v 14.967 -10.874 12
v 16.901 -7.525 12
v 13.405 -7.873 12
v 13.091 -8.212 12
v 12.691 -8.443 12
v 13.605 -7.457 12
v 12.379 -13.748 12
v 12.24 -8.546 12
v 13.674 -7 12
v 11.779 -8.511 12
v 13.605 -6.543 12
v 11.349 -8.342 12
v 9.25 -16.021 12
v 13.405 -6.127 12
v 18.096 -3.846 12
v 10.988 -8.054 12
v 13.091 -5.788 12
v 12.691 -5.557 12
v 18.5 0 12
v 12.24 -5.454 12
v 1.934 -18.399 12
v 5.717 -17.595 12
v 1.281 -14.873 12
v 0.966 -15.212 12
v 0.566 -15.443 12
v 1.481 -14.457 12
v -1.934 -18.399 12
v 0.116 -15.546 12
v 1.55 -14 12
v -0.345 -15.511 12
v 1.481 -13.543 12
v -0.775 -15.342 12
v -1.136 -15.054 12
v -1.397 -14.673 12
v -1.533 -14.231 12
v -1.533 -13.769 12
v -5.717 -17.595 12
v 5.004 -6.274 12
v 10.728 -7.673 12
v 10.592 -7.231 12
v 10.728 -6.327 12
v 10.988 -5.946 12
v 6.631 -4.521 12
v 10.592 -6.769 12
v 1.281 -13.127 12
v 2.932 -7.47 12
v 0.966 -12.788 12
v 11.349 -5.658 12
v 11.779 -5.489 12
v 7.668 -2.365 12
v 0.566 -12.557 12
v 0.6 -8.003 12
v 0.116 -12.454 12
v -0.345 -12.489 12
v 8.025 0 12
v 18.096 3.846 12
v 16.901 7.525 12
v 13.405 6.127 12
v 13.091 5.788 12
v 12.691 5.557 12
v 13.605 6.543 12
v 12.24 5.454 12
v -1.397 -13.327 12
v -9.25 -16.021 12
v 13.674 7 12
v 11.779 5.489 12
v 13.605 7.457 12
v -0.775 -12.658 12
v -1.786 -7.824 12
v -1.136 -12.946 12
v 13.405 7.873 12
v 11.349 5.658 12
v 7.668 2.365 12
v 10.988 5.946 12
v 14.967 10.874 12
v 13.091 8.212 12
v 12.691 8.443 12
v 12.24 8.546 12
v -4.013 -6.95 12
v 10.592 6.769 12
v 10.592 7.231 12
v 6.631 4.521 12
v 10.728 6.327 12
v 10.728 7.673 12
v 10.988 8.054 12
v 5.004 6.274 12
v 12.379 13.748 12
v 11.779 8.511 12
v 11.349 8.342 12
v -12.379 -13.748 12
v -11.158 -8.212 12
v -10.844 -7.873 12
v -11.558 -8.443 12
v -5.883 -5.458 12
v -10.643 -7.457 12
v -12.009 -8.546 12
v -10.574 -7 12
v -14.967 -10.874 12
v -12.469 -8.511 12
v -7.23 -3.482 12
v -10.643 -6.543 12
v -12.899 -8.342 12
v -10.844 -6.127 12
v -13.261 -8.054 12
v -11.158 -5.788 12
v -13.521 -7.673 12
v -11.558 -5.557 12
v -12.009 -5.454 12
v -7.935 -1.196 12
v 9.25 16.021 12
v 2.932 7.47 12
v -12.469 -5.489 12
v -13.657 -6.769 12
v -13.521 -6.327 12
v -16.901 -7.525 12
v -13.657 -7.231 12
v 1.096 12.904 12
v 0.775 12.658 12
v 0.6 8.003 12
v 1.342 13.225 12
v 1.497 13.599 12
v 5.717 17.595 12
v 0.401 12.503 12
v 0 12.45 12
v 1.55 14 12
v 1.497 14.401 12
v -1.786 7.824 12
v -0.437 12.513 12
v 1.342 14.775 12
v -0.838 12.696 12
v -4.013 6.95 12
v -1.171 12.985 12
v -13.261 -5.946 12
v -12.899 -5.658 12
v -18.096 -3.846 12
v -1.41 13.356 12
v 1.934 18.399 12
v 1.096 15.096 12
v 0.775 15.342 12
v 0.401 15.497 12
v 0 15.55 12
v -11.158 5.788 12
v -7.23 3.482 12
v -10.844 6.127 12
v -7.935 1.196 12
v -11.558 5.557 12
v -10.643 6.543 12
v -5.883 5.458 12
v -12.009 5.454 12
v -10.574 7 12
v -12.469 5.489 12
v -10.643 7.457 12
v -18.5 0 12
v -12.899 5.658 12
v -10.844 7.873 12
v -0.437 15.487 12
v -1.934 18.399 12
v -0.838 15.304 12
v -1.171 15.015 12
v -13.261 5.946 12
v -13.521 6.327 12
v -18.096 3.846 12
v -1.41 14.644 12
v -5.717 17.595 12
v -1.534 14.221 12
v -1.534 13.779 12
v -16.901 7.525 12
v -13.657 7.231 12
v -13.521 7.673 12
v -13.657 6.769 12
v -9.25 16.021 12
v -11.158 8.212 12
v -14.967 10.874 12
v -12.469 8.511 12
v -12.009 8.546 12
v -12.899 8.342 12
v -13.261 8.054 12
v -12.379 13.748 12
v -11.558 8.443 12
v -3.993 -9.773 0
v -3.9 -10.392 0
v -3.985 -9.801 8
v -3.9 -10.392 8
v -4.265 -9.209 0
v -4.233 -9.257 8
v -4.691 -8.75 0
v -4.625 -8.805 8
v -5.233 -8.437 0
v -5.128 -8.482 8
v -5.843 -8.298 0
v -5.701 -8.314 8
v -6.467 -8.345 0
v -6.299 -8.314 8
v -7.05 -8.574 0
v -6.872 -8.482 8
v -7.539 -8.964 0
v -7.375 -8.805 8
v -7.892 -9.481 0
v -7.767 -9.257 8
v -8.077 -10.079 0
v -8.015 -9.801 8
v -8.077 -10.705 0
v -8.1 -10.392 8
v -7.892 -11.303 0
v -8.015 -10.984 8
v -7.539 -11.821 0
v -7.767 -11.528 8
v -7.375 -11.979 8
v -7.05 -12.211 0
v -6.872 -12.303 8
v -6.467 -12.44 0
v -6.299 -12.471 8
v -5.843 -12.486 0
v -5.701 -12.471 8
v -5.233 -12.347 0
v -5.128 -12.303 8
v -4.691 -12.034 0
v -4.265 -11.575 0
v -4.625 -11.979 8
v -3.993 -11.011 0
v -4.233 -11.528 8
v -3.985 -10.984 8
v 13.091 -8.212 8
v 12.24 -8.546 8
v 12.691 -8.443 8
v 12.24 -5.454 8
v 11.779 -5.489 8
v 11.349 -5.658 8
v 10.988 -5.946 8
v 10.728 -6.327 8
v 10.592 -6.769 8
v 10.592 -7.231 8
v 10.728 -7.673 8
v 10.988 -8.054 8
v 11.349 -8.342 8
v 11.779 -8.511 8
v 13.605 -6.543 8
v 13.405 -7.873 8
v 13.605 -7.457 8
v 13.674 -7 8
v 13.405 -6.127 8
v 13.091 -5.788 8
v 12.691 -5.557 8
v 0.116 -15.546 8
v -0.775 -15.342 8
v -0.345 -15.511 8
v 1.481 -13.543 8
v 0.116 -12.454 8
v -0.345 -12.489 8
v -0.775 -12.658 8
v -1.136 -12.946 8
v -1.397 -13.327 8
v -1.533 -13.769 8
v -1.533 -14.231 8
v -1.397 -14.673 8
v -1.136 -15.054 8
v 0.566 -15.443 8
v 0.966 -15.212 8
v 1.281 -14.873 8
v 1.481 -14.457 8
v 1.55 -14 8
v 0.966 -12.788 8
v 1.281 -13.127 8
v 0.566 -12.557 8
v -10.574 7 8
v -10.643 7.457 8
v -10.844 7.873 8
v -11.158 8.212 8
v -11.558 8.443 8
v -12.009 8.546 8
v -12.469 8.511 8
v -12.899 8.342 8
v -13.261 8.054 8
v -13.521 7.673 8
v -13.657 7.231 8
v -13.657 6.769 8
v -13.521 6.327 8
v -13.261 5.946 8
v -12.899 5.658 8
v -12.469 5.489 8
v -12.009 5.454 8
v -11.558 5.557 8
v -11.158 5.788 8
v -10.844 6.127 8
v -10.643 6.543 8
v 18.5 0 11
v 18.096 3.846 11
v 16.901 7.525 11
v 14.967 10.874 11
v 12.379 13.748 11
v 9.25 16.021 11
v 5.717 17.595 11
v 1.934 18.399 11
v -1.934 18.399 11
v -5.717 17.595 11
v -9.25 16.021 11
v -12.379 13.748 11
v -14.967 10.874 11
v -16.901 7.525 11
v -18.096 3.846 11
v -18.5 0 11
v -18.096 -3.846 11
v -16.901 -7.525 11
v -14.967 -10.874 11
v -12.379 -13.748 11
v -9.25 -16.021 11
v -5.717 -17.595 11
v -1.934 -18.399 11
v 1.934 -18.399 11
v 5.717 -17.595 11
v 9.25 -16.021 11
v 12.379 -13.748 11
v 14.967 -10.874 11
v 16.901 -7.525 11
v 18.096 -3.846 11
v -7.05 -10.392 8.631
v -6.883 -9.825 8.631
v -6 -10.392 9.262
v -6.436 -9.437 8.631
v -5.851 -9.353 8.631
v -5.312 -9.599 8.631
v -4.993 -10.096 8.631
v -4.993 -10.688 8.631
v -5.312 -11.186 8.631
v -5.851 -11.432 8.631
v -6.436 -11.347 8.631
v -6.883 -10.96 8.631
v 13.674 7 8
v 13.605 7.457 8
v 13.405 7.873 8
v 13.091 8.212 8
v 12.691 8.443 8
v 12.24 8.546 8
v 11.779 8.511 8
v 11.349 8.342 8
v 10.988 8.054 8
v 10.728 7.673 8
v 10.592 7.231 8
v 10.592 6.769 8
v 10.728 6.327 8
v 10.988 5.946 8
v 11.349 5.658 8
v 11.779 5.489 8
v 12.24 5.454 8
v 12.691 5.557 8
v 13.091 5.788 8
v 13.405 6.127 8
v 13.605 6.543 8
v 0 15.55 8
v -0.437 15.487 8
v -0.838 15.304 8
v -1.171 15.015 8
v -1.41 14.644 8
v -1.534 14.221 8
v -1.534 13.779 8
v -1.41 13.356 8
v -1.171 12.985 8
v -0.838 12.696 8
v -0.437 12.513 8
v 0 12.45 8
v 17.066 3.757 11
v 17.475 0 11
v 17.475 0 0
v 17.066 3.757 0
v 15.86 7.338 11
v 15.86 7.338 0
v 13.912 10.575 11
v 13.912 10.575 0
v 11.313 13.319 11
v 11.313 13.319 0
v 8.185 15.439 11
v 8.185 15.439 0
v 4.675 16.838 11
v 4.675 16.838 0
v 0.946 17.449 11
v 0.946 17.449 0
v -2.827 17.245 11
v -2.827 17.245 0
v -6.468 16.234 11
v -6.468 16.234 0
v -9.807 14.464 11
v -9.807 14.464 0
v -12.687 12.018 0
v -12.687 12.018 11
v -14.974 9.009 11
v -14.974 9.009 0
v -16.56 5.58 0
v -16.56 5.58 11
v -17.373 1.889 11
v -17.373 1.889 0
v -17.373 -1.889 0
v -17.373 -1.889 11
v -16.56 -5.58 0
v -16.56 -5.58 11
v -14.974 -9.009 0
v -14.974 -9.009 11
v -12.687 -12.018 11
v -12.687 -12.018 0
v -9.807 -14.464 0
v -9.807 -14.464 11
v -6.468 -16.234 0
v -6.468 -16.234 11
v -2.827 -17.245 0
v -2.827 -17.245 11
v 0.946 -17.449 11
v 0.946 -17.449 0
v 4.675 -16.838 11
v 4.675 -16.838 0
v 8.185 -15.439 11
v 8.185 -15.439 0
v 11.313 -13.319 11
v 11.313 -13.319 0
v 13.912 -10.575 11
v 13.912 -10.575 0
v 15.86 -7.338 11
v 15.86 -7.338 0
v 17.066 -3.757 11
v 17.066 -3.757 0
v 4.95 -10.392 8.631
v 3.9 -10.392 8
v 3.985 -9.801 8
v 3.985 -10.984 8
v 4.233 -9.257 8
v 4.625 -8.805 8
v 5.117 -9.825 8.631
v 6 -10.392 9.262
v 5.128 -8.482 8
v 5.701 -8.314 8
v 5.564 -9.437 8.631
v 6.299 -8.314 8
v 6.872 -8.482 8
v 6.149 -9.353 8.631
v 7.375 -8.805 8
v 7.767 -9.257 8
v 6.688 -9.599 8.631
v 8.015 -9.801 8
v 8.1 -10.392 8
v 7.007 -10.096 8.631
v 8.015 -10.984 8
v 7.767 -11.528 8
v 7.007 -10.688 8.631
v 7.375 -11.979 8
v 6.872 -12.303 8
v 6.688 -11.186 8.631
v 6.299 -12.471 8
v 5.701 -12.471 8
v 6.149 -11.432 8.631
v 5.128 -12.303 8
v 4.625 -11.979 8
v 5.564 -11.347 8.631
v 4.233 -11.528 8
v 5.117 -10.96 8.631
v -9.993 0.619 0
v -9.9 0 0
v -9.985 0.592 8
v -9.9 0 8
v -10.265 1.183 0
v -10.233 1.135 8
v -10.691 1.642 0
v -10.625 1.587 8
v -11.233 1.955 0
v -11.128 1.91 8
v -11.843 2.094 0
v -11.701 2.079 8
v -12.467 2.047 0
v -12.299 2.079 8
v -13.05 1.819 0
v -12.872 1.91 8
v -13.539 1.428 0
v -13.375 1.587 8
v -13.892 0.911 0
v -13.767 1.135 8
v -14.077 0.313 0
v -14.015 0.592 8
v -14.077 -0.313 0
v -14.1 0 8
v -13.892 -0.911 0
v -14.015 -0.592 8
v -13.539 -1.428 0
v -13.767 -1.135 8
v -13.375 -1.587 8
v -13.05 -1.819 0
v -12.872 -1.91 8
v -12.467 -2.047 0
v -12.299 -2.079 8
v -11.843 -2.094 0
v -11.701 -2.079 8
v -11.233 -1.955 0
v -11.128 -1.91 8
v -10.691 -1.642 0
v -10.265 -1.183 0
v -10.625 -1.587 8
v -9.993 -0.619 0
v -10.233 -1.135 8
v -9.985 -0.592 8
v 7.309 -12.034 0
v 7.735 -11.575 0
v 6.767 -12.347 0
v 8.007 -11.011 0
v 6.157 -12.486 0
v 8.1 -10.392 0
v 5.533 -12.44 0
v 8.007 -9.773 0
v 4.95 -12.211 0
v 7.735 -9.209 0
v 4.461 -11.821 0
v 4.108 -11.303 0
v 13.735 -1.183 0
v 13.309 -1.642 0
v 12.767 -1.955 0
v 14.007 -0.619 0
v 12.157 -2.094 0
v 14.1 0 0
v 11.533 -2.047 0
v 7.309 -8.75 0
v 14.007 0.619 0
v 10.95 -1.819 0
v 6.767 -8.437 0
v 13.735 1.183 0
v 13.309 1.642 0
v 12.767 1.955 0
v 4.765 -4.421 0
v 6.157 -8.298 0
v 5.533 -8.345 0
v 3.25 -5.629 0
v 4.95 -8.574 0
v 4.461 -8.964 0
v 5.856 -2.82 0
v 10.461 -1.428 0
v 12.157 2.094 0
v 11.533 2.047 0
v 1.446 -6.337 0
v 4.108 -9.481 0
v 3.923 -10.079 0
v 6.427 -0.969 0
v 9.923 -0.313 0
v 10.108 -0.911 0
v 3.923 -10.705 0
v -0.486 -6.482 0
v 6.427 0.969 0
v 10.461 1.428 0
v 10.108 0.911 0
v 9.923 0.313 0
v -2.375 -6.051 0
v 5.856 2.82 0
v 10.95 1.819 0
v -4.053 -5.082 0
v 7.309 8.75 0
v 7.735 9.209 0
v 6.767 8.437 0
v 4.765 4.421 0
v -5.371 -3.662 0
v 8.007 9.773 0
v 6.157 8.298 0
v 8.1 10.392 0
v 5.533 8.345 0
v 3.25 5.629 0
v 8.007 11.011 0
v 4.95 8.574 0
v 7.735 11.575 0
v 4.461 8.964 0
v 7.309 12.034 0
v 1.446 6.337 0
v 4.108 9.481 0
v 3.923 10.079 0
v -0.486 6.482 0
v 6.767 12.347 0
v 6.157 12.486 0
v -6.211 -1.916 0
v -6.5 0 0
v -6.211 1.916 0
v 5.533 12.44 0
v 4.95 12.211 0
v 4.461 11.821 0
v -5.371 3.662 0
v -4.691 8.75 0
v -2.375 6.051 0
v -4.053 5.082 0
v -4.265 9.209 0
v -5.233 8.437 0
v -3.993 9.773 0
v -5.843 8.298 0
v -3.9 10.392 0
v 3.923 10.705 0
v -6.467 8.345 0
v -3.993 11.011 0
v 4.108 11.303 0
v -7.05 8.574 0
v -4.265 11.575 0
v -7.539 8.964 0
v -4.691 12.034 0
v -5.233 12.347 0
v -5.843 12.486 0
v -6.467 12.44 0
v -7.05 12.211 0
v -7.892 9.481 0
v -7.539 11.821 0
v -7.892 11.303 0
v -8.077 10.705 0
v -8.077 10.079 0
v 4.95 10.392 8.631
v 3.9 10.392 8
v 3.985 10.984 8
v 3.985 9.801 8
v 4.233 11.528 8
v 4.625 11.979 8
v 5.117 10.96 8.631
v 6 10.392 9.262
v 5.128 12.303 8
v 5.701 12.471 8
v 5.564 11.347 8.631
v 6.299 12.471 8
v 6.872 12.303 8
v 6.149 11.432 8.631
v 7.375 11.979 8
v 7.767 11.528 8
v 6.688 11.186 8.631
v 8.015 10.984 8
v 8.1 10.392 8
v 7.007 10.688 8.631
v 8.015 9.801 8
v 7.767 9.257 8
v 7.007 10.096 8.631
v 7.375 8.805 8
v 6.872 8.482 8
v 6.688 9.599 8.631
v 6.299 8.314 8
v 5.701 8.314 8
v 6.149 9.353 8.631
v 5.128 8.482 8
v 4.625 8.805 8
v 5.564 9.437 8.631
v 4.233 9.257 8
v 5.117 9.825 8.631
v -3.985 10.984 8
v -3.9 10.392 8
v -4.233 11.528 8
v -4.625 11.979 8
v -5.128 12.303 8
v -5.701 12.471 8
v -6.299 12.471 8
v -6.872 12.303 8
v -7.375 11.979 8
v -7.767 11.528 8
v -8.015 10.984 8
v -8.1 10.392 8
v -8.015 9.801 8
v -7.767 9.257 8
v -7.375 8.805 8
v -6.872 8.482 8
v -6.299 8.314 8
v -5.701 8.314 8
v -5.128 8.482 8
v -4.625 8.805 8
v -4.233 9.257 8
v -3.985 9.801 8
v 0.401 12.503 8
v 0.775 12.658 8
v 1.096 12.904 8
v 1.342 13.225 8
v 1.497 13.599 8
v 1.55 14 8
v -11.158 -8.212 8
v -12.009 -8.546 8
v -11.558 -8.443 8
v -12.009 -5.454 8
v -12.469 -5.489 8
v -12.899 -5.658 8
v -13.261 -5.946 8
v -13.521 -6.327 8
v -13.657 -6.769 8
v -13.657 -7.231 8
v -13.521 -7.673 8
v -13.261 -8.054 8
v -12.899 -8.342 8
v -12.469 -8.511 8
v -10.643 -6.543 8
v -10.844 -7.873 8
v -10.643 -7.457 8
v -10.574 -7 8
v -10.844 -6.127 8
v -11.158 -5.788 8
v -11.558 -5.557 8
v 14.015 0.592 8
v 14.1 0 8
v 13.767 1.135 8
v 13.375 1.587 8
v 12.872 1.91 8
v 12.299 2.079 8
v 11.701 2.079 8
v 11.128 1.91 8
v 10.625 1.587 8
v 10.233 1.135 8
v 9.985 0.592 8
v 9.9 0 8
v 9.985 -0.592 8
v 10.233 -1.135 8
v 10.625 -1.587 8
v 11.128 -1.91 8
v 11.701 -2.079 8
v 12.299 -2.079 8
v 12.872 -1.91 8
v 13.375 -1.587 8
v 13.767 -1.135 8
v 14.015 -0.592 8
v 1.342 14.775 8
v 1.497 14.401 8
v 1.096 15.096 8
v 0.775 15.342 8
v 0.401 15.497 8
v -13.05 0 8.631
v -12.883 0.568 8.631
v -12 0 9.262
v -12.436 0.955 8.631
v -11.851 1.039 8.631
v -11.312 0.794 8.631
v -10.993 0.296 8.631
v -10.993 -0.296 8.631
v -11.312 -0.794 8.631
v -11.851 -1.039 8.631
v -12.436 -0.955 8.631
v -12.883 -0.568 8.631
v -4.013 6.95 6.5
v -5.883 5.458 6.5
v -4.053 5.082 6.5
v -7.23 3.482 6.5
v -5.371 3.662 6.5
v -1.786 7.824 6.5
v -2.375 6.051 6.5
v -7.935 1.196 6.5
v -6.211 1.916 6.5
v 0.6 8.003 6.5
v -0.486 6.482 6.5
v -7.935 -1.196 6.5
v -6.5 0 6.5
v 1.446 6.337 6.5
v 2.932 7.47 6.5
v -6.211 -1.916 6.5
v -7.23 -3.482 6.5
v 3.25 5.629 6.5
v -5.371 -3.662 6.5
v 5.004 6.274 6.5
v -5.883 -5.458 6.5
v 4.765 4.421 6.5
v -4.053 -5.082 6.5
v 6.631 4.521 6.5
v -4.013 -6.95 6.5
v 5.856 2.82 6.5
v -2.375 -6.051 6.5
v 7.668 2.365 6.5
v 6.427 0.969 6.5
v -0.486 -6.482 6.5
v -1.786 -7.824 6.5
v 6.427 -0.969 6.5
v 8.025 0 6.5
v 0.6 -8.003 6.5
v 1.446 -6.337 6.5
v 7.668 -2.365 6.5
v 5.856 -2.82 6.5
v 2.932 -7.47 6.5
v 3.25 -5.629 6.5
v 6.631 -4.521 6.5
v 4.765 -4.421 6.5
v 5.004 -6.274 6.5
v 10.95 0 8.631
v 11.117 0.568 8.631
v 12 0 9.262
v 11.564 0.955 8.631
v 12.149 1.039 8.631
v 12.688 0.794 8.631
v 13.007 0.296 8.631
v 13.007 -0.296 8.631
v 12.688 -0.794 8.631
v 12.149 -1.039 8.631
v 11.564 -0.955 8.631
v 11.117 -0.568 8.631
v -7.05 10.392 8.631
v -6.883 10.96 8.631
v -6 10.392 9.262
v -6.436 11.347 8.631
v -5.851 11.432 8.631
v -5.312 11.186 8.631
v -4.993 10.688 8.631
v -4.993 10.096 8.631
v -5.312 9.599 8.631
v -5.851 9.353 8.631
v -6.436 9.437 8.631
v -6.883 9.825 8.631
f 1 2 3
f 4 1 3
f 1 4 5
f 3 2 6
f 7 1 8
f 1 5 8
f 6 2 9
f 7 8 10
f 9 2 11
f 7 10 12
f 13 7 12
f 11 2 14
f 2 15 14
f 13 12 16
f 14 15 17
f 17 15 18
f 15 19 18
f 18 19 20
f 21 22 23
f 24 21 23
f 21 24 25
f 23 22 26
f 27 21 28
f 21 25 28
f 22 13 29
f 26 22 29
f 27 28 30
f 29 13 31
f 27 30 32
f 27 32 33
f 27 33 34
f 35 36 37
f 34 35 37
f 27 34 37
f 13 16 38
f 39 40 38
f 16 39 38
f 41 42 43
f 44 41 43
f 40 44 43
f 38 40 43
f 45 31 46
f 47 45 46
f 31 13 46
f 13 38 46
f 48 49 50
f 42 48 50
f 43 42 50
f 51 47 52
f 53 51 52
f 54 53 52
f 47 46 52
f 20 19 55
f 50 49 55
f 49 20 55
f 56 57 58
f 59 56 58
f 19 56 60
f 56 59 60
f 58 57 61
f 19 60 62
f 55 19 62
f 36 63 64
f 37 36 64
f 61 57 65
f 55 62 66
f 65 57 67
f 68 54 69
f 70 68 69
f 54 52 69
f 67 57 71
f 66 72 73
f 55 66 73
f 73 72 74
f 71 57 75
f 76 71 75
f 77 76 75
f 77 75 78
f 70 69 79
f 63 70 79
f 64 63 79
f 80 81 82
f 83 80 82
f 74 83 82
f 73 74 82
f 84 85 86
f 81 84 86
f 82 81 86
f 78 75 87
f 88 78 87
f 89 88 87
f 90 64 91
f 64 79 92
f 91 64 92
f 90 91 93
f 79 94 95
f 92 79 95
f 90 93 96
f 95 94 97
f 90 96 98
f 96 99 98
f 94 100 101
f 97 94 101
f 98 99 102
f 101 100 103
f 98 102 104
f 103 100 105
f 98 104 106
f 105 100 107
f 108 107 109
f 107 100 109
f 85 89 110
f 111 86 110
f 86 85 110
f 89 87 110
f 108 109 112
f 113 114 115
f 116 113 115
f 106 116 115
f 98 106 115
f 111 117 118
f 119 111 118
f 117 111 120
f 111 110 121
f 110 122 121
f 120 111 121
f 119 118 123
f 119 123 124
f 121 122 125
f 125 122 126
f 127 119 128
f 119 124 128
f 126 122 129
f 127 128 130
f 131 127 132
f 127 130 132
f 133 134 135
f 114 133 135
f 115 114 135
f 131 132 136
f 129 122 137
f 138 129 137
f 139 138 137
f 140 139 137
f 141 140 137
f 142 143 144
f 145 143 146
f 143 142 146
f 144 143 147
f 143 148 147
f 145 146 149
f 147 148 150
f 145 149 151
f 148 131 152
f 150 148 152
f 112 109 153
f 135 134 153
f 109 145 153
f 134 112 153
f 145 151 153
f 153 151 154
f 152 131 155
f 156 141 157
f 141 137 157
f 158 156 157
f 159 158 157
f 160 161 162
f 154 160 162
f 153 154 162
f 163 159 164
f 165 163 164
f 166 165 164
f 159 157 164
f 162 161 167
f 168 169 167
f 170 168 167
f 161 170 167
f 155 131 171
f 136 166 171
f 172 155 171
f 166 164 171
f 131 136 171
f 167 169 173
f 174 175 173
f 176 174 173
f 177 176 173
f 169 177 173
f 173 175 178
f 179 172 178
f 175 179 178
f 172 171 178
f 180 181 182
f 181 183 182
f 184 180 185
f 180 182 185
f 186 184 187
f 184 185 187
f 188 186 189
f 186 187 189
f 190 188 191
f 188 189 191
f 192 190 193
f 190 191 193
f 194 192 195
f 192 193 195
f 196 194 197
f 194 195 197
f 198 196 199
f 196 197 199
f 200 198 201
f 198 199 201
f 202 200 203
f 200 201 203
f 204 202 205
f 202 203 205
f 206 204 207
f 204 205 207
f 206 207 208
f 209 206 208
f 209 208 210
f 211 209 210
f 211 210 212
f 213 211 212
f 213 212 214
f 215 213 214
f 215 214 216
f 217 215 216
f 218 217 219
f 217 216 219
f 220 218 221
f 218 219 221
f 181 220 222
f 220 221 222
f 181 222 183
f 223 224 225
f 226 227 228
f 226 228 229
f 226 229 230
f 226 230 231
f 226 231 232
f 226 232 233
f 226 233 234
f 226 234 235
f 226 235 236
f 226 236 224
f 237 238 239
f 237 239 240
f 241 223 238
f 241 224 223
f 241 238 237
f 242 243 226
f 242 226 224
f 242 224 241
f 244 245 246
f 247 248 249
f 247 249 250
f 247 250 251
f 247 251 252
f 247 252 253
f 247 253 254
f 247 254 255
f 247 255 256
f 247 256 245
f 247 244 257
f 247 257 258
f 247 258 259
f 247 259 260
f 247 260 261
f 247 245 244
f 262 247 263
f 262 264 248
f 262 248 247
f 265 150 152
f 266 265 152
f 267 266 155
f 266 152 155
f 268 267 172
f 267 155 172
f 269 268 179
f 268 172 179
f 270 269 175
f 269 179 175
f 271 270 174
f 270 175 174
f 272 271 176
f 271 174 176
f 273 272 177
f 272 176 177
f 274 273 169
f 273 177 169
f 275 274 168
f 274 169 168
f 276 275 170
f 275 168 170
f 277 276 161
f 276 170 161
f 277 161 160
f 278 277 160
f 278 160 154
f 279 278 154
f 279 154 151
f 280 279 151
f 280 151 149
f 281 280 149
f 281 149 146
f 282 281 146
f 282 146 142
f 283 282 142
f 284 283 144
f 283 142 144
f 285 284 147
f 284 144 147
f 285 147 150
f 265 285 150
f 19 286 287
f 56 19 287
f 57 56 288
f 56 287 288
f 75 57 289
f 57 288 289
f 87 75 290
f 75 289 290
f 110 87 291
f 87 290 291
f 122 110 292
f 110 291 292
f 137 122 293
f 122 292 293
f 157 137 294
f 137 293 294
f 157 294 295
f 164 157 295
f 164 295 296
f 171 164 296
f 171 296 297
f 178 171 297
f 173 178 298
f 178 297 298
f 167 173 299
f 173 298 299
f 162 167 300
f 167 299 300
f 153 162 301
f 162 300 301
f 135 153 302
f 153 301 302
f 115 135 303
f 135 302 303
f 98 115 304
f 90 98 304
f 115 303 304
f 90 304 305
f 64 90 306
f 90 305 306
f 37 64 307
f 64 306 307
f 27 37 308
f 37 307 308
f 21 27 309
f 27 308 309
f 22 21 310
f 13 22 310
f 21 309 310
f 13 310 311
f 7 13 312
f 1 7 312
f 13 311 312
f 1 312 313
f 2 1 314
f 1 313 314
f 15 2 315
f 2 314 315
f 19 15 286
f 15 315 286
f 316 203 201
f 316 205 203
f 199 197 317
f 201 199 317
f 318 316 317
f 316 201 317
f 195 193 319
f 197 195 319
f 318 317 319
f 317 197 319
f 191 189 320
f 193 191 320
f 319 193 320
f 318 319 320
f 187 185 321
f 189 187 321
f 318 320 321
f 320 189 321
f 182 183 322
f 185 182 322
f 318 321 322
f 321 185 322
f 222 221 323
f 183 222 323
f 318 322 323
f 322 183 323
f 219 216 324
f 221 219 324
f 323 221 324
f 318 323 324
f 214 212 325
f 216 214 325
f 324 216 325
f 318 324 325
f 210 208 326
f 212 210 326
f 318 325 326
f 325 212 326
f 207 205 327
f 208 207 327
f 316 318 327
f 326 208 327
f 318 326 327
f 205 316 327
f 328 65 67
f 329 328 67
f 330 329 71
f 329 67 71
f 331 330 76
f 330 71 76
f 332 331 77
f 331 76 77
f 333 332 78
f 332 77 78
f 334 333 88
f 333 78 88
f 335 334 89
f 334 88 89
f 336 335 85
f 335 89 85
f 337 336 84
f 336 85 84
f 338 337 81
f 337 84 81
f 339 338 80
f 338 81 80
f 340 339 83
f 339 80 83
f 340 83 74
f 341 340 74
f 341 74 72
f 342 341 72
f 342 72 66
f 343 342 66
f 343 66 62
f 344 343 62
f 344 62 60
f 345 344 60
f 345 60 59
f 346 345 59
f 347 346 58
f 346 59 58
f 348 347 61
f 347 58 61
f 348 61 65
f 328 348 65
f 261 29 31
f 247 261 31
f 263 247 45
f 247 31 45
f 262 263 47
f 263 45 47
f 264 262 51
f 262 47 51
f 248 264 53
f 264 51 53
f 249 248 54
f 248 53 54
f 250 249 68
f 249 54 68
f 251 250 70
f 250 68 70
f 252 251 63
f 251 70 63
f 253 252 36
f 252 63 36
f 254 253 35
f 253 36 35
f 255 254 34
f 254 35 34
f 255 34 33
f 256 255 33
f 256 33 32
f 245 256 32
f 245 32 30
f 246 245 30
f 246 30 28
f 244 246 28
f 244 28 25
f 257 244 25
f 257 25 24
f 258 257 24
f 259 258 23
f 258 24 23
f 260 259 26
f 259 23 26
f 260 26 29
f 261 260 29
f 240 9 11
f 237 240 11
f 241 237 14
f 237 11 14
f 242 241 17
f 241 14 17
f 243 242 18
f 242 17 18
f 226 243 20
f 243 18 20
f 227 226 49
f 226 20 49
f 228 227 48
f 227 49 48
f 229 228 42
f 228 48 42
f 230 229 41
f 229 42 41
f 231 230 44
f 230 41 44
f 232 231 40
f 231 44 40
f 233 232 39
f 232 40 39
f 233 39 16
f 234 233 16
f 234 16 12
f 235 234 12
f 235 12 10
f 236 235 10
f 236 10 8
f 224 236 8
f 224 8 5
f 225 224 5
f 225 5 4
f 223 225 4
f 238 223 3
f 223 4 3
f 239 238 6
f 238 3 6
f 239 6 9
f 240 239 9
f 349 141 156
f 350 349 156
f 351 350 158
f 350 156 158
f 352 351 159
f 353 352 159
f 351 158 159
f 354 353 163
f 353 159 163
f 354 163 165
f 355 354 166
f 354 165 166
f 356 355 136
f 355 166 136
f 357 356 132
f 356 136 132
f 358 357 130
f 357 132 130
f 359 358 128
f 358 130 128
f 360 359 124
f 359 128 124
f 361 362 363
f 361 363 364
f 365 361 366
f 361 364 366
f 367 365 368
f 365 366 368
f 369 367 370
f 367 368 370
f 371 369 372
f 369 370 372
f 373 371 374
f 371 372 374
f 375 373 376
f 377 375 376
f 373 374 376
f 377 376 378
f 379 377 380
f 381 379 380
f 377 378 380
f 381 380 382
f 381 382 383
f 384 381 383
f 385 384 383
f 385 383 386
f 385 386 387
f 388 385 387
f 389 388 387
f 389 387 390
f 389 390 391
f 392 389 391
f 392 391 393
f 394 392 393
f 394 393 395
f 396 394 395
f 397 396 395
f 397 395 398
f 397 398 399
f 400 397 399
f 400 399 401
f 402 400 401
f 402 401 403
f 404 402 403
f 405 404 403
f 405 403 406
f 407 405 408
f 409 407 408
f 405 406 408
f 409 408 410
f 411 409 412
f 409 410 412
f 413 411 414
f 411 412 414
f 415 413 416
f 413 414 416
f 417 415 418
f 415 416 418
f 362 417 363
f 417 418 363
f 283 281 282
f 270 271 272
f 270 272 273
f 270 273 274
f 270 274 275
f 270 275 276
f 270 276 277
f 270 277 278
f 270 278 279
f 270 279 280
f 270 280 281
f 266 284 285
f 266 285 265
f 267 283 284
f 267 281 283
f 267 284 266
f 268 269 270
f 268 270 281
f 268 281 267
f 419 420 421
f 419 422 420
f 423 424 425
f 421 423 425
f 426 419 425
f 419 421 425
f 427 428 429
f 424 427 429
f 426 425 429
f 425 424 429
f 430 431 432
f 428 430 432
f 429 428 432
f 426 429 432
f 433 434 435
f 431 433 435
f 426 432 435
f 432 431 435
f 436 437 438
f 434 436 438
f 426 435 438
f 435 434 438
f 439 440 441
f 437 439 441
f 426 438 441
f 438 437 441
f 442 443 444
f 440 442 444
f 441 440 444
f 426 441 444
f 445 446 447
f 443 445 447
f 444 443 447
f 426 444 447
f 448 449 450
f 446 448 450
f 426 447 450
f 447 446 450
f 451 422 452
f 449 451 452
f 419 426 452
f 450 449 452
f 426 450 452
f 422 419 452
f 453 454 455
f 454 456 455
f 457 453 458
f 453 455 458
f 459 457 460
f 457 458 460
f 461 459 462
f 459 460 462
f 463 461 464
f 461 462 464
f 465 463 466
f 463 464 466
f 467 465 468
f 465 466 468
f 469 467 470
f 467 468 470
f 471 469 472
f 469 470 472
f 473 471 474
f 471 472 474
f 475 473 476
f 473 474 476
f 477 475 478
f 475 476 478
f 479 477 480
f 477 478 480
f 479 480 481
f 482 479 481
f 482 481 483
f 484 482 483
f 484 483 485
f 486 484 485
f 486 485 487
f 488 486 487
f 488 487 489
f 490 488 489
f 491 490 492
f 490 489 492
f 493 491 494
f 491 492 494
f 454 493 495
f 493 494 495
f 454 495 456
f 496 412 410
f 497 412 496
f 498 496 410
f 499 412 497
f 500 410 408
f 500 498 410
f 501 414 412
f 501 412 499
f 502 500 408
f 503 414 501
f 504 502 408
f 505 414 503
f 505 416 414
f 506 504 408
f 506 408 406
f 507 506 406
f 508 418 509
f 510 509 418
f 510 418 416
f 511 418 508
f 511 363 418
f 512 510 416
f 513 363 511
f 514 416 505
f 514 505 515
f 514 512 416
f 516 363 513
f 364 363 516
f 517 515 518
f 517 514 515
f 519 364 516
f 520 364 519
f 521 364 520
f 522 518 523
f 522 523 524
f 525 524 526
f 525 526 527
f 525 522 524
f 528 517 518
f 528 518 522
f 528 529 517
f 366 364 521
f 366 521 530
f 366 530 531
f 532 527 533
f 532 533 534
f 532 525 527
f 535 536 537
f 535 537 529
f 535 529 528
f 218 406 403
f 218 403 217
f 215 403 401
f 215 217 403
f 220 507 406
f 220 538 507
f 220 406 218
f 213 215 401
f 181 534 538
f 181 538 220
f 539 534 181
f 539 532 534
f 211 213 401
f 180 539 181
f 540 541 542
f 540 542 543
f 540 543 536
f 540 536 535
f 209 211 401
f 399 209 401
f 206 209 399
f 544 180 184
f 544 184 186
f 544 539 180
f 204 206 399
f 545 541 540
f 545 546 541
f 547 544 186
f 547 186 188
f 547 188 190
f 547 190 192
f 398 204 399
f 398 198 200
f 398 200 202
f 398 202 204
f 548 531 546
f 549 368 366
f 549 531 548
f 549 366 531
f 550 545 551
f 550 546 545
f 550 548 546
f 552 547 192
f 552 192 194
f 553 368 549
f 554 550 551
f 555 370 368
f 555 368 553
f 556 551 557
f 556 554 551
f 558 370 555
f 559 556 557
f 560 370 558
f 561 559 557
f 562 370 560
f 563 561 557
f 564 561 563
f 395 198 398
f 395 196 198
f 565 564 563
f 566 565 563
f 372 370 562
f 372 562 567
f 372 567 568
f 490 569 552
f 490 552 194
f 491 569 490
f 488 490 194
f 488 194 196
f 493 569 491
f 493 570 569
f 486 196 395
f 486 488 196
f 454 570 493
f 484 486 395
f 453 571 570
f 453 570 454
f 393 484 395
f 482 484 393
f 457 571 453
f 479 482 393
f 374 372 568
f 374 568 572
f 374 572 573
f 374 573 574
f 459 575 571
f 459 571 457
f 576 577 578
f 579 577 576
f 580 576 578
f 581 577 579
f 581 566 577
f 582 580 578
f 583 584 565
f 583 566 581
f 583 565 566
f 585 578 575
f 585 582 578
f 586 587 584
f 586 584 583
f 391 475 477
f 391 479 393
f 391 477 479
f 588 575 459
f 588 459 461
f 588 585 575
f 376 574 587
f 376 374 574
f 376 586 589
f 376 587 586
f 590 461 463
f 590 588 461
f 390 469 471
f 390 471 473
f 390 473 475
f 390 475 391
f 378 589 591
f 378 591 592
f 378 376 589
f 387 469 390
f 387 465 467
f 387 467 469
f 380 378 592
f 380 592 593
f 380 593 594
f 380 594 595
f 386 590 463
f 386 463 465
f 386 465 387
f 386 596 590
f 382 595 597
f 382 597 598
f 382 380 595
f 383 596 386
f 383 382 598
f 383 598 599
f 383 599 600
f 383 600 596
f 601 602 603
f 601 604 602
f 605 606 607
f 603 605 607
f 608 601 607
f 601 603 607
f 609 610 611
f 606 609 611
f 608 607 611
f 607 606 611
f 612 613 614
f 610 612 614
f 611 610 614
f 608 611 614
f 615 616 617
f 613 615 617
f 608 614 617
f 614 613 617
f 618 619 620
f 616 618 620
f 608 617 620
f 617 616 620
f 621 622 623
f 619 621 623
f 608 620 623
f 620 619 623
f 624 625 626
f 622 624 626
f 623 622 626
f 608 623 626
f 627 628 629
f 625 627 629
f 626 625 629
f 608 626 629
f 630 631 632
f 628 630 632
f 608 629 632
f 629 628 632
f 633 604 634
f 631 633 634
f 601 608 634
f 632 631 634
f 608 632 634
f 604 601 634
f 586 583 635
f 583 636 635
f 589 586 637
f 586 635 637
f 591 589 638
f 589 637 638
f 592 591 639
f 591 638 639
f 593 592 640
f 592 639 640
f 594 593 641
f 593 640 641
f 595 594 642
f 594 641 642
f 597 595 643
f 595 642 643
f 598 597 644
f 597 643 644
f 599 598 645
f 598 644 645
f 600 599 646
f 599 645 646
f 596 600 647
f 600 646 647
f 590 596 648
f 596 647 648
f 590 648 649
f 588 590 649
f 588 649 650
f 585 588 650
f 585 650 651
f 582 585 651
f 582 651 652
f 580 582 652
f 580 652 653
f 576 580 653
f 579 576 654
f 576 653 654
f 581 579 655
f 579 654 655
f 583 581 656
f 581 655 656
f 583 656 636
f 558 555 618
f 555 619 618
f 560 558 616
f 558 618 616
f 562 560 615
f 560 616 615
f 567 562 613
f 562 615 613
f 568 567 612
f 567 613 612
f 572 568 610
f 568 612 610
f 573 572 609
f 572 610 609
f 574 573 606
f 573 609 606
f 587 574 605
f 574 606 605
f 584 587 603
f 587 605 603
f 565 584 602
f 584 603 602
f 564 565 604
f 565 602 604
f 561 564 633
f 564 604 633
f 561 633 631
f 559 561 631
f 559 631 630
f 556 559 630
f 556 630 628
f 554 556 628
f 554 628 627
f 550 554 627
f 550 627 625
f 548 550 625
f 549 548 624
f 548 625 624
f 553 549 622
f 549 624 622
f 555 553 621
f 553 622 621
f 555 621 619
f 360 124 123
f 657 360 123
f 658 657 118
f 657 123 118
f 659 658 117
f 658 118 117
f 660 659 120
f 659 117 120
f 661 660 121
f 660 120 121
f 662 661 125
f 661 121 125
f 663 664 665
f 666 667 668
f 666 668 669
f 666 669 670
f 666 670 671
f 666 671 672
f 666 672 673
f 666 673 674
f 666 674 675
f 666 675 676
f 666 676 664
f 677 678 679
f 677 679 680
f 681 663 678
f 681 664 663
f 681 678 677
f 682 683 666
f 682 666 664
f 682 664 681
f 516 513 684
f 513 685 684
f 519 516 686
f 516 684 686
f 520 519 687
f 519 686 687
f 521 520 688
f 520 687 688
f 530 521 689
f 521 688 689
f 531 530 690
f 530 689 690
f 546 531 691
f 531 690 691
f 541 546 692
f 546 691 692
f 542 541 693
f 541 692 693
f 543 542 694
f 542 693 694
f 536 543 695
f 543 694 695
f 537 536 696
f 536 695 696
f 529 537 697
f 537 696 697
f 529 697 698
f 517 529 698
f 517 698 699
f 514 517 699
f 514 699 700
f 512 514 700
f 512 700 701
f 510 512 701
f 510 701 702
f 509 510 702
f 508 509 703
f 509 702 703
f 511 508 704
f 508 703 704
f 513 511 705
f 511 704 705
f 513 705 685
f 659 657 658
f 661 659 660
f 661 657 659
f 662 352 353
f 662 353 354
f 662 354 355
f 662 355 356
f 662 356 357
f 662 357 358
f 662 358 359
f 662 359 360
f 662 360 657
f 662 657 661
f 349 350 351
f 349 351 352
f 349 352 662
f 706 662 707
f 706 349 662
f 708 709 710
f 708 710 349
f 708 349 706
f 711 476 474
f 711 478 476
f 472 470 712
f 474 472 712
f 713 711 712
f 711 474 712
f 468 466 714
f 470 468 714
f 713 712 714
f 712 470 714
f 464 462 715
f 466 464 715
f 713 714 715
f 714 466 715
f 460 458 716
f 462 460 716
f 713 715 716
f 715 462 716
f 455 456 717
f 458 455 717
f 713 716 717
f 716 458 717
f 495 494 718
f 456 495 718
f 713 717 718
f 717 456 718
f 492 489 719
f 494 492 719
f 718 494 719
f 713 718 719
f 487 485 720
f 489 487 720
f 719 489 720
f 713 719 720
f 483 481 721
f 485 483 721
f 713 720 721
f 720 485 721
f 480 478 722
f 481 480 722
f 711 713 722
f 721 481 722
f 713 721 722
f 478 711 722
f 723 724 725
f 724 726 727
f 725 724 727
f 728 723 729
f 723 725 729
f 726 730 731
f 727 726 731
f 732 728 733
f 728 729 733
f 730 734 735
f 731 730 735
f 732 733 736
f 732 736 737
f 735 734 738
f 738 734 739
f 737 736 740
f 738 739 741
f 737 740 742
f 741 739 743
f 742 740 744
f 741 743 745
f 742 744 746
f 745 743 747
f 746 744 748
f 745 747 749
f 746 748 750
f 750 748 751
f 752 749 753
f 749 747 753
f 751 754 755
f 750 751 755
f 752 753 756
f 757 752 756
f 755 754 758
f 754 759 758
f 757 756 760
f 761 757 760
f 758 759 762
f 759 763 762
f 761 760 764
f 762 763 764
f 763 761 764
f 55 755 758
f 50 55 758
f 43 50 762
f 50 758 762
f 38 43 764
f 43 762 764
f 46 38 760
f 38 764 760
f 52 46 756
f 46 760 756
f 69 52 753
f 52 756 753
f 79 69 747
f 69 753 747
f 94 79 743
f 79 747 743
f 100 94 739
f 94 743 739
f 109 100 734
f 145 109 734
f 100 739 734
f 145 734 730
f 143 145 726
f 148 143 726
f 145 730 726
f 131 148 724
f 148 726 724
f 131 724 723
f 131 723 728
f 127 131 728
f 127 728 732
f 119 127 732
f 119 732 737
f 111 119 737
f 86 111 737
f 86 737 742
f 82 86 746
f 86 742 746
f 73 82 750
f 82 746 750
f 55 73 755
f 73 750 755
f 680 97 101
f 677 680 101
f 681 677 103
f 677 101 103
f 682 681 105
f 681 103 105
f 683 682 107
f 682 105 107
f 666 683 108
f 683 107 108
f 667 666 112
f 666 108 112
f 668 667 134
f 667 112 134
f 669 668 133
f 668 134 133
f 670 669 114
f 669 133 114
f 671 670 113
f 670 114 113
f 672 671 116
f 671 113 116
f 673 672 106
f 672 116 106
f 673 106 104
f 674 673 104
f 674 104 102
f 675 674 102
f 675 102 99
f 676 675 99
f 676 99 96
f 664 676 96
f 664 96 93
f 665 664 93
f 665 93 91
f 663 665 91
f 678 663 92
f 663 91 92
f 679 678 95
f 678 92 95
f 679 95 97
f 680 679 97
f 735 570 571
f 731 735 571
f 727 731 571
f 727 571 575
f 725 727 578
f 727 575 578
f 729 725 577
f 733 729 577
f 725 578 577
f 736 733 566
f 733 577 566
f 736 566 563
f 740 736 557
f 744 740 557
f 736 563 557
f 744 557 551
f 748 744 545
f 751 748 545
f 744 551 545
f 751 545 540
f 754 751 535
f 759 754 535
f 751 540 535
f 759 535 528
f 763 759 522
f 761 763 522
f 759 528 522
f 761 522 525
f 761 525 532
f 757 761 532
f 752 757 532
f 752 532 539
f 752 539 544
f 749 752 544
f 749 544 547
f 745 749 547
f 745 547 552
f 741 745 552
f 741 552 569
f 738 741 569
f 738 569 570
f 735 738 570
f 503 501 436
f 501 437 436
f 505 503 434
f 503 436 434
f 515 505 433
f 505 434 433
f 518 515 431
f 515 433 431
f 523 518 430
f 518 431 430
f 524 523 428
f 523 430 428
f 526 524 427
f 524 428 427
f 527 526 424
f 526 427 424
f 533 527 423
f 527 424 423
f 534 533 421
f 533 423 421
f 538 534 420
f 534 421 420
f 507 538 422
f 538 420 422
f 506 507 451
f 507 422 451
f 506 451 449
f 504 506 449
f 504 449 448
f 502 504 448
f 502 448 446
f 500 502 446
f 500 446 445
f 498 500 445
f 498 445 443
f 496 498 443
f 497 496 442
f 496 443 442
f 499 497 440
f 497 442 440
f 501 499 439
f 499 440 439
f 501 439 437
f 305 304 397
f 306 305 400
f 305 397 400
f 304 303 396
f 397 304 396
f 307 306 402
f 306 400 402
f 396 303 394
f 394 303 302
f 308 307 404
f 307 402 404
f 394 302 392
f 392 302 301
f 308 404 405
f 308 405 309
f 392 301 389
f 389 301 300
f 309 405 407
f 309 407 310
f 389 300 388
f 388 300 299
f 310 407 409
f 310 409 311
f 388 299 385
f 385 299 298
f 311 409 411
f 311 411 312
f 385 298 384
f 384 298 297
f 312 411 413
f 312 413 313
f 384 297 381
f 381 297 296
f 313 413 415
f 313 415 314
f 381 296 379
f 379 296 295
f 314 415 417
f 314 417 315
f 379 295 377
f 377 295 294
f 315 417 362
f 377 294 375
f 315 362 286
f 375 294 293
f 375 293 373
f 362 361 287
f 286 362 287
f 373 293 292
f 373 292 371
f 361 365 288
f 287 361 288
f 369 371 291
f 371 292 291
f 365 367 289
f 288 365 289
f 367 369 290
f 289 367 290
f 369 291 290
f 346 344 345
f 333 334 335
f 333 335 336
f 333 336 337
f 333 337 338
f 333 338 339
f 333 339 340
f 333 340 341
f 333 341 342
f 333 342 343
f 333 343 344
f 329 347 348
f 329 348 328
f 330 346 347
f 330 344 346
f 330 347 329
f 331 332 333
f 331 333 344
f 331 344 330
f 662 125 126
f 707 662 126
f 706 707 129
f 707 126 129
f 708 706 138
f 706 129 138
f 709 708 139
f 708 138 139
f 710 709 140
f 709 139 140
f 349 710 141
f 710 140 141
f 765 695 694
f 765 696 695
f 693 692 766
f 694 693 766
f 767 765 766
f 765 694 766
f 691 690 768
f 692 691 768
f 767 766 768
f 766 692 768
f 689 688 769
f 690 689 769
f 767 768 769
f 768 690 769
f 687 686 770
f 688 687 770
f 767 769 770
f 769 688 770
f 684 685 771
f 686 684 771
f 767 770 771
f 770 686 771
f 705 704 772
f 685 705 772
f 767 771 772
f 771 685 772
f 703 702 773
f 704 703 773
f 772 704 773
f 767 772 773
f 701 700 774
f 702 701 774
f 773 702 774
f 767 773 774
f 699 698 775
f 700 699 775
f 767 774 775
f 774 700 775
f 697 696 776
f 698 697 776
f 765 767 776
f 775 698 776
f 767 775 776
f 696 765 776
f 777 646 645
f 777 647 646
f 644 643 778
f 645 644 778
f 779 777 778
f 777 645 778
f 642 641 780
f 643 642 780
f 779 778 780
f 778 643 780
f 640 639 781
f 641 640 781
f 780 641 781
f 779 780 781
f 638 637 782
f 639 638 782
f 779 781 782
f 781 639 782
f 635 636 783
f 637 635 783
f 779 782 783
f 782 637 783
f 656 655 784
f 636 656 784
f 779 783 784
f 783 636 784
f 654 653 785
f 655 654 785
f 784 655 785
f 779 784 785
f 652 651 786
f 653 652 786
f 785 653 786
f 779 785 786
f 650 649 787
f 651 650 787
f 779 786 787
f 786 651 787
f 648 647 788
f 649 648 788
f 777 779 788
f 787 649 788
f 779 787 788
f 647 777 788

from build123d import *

# Parameters (mm, degrees)
SKETCH1_R             = 17.475
SKETCH1_R_2           = 8.025
BOSS_EXTRUDE1_DEPTH   = 12
CUT_EXTRUDE1_START    = 12
SKETCH1_3_R           = 1.55
CUT_EXTRUDE1_DEPTH    = 4
BOSS_EXTRUDE2_START   = 11
SKETCH1_4_R           = 18.5
SKETCH1_4_R_2         = 17.475
BOSS_EXTRUDE2_DEPTH   = 1
SKETCH2_R             = 8.025
SKETCH2_R_2           = 6.5
BOSS_EXTRUDE3_DEPTH   = 12
CUT_EXTRUDE2_START    = -6.5
SKETCH2_2_R           = 8.025
SKETCH2_2_R_2         = 6.5
CUT_EXTRUDE2_DEPTH    = 5.5
M5_TAPPED_HOLE1_D     = 4.2
M5_TAPPED_HOLE1_DEPTH = 8
M5_TAPPED_HOLE1_TIP   = 1.2618073


with BuildPart() as part:
    # Sketch1 → Boss-Extrude1 (new body)
    with BuildSketch(Plane.XY):
        Circle(SKETCH1_R)
        Circle(SKETCH1_R_2, mode=Mode.SUBTRACT)
    extrude(amount=BOSS_EXTRUDE1_DEPTH)

    # Sketch1<3> → Cut-Extrude1 (cut)
    with BuildSketch(Plane.XY.offset(CUT_EXTRUDE1_START)):
        with Locations((-12.124355653, 7)):
            Circle(SKETCH1_3_R)
        with BuildLine():
            ThreePointArc((0, 15.55), (-1.55, 14), (0, 12.45))
            Line((0, 12.45), (0, 15.55))
        make_face()
        with BuildLine():
            Line((0, 15.55), (0, 12.45))
            ThreePointArc((0, 12.45), (1.096015511, 12.903984489), (1.55, 14))
            ThreePointArc((1.55, 14), (1.096015511, 15.096015511), (0, 15.55))
        make_face()
        with Locations((12.124355653, 7)):
            Circle(SKETCH1_3_R)
        with Locations((12.124355653, -7)):
            Circle(SKETCH1_3_R)
        with Locations((0, -14)):
            Circle(SKETCH1_3_R)
        with Locations((-12.124355653, -7)):
            Circle(SKETCH1_3_R)
    extrude(amount=-CUT_EXTRUDE1_DEPTH, mode=Mode.SUBTRACT)

    # Sketch1<4> → Boss-Extrude2 (add)
    with BuildSketch(Plane.XY.offset(BOSS_EXTRUDE2_START)):
        Circle(SKETCH1_4_R)
        Circle(SKETCH1_4_R_2, mode=Mode.SUBTRACT)
    extrude(amount=BOSS_EXTRUDE2_DEPTH)

    # Sketch2 → Boss-Extrude3 (add)
    with BuildSketch(Plane(origin=(0, 0, 0), x_dir=(-1, 0, 0), z_dir=(0, 0, -1))):
        Circle(SKETCH2_R)
        Circle(SKETCH2_R_2, mode=Mode.SUBTRACT)
    extrude(amount=-BOSS_EXTRUDE3_DEPTH)

    # Sketch2<2> → Cut-Extrude2 (cut)
    with BuildSketch(Plane(origin=(0, 0, 0), x_dir=(-1, 0, 0), z_dir=(0, 0, -1)).offset(CUT_EXTRUDE2_START)):
        with Locations(Location((0, 0, 0), (0, 0, 180))):
            Circle(SKETCH2_2_R)
        Circle(SKETCH2_2_R_2, mode=Mode.SUBTRACT)
    extrude(amount=-CUT_EXTRUDE2_DEPTH, mode=Mode.SUBTRACT)

    # M5 Tapped Hole1
    with Locations(Plane(origin=(0, 0, 0), x_dir=(-1, 0, 0), z_dir=(0, 0, -1))):
        with Locations((-12, 0), (-6, -10.392304845), (6, -10.392304845), (6, 10.392304845), (12, 0), (-6, 10.392304845)):
            Hole(M5_TAPPED_HOLE1_D / 2, depth=M5_TAPPED_HOLE1_DEPTH)
            with Locations((0, 0, -(M5_TAPPED_HOLE1_DEPTH + M5_TAPPED_HOLE1_TIP / 2))):  # 118° drill point
                Cone(0, M5_TAPPED_HOLE1_D / 2, M5_TAPPED_HOLE1_TIP, mode=Mode.SUBTRACT)


solid = part.part
